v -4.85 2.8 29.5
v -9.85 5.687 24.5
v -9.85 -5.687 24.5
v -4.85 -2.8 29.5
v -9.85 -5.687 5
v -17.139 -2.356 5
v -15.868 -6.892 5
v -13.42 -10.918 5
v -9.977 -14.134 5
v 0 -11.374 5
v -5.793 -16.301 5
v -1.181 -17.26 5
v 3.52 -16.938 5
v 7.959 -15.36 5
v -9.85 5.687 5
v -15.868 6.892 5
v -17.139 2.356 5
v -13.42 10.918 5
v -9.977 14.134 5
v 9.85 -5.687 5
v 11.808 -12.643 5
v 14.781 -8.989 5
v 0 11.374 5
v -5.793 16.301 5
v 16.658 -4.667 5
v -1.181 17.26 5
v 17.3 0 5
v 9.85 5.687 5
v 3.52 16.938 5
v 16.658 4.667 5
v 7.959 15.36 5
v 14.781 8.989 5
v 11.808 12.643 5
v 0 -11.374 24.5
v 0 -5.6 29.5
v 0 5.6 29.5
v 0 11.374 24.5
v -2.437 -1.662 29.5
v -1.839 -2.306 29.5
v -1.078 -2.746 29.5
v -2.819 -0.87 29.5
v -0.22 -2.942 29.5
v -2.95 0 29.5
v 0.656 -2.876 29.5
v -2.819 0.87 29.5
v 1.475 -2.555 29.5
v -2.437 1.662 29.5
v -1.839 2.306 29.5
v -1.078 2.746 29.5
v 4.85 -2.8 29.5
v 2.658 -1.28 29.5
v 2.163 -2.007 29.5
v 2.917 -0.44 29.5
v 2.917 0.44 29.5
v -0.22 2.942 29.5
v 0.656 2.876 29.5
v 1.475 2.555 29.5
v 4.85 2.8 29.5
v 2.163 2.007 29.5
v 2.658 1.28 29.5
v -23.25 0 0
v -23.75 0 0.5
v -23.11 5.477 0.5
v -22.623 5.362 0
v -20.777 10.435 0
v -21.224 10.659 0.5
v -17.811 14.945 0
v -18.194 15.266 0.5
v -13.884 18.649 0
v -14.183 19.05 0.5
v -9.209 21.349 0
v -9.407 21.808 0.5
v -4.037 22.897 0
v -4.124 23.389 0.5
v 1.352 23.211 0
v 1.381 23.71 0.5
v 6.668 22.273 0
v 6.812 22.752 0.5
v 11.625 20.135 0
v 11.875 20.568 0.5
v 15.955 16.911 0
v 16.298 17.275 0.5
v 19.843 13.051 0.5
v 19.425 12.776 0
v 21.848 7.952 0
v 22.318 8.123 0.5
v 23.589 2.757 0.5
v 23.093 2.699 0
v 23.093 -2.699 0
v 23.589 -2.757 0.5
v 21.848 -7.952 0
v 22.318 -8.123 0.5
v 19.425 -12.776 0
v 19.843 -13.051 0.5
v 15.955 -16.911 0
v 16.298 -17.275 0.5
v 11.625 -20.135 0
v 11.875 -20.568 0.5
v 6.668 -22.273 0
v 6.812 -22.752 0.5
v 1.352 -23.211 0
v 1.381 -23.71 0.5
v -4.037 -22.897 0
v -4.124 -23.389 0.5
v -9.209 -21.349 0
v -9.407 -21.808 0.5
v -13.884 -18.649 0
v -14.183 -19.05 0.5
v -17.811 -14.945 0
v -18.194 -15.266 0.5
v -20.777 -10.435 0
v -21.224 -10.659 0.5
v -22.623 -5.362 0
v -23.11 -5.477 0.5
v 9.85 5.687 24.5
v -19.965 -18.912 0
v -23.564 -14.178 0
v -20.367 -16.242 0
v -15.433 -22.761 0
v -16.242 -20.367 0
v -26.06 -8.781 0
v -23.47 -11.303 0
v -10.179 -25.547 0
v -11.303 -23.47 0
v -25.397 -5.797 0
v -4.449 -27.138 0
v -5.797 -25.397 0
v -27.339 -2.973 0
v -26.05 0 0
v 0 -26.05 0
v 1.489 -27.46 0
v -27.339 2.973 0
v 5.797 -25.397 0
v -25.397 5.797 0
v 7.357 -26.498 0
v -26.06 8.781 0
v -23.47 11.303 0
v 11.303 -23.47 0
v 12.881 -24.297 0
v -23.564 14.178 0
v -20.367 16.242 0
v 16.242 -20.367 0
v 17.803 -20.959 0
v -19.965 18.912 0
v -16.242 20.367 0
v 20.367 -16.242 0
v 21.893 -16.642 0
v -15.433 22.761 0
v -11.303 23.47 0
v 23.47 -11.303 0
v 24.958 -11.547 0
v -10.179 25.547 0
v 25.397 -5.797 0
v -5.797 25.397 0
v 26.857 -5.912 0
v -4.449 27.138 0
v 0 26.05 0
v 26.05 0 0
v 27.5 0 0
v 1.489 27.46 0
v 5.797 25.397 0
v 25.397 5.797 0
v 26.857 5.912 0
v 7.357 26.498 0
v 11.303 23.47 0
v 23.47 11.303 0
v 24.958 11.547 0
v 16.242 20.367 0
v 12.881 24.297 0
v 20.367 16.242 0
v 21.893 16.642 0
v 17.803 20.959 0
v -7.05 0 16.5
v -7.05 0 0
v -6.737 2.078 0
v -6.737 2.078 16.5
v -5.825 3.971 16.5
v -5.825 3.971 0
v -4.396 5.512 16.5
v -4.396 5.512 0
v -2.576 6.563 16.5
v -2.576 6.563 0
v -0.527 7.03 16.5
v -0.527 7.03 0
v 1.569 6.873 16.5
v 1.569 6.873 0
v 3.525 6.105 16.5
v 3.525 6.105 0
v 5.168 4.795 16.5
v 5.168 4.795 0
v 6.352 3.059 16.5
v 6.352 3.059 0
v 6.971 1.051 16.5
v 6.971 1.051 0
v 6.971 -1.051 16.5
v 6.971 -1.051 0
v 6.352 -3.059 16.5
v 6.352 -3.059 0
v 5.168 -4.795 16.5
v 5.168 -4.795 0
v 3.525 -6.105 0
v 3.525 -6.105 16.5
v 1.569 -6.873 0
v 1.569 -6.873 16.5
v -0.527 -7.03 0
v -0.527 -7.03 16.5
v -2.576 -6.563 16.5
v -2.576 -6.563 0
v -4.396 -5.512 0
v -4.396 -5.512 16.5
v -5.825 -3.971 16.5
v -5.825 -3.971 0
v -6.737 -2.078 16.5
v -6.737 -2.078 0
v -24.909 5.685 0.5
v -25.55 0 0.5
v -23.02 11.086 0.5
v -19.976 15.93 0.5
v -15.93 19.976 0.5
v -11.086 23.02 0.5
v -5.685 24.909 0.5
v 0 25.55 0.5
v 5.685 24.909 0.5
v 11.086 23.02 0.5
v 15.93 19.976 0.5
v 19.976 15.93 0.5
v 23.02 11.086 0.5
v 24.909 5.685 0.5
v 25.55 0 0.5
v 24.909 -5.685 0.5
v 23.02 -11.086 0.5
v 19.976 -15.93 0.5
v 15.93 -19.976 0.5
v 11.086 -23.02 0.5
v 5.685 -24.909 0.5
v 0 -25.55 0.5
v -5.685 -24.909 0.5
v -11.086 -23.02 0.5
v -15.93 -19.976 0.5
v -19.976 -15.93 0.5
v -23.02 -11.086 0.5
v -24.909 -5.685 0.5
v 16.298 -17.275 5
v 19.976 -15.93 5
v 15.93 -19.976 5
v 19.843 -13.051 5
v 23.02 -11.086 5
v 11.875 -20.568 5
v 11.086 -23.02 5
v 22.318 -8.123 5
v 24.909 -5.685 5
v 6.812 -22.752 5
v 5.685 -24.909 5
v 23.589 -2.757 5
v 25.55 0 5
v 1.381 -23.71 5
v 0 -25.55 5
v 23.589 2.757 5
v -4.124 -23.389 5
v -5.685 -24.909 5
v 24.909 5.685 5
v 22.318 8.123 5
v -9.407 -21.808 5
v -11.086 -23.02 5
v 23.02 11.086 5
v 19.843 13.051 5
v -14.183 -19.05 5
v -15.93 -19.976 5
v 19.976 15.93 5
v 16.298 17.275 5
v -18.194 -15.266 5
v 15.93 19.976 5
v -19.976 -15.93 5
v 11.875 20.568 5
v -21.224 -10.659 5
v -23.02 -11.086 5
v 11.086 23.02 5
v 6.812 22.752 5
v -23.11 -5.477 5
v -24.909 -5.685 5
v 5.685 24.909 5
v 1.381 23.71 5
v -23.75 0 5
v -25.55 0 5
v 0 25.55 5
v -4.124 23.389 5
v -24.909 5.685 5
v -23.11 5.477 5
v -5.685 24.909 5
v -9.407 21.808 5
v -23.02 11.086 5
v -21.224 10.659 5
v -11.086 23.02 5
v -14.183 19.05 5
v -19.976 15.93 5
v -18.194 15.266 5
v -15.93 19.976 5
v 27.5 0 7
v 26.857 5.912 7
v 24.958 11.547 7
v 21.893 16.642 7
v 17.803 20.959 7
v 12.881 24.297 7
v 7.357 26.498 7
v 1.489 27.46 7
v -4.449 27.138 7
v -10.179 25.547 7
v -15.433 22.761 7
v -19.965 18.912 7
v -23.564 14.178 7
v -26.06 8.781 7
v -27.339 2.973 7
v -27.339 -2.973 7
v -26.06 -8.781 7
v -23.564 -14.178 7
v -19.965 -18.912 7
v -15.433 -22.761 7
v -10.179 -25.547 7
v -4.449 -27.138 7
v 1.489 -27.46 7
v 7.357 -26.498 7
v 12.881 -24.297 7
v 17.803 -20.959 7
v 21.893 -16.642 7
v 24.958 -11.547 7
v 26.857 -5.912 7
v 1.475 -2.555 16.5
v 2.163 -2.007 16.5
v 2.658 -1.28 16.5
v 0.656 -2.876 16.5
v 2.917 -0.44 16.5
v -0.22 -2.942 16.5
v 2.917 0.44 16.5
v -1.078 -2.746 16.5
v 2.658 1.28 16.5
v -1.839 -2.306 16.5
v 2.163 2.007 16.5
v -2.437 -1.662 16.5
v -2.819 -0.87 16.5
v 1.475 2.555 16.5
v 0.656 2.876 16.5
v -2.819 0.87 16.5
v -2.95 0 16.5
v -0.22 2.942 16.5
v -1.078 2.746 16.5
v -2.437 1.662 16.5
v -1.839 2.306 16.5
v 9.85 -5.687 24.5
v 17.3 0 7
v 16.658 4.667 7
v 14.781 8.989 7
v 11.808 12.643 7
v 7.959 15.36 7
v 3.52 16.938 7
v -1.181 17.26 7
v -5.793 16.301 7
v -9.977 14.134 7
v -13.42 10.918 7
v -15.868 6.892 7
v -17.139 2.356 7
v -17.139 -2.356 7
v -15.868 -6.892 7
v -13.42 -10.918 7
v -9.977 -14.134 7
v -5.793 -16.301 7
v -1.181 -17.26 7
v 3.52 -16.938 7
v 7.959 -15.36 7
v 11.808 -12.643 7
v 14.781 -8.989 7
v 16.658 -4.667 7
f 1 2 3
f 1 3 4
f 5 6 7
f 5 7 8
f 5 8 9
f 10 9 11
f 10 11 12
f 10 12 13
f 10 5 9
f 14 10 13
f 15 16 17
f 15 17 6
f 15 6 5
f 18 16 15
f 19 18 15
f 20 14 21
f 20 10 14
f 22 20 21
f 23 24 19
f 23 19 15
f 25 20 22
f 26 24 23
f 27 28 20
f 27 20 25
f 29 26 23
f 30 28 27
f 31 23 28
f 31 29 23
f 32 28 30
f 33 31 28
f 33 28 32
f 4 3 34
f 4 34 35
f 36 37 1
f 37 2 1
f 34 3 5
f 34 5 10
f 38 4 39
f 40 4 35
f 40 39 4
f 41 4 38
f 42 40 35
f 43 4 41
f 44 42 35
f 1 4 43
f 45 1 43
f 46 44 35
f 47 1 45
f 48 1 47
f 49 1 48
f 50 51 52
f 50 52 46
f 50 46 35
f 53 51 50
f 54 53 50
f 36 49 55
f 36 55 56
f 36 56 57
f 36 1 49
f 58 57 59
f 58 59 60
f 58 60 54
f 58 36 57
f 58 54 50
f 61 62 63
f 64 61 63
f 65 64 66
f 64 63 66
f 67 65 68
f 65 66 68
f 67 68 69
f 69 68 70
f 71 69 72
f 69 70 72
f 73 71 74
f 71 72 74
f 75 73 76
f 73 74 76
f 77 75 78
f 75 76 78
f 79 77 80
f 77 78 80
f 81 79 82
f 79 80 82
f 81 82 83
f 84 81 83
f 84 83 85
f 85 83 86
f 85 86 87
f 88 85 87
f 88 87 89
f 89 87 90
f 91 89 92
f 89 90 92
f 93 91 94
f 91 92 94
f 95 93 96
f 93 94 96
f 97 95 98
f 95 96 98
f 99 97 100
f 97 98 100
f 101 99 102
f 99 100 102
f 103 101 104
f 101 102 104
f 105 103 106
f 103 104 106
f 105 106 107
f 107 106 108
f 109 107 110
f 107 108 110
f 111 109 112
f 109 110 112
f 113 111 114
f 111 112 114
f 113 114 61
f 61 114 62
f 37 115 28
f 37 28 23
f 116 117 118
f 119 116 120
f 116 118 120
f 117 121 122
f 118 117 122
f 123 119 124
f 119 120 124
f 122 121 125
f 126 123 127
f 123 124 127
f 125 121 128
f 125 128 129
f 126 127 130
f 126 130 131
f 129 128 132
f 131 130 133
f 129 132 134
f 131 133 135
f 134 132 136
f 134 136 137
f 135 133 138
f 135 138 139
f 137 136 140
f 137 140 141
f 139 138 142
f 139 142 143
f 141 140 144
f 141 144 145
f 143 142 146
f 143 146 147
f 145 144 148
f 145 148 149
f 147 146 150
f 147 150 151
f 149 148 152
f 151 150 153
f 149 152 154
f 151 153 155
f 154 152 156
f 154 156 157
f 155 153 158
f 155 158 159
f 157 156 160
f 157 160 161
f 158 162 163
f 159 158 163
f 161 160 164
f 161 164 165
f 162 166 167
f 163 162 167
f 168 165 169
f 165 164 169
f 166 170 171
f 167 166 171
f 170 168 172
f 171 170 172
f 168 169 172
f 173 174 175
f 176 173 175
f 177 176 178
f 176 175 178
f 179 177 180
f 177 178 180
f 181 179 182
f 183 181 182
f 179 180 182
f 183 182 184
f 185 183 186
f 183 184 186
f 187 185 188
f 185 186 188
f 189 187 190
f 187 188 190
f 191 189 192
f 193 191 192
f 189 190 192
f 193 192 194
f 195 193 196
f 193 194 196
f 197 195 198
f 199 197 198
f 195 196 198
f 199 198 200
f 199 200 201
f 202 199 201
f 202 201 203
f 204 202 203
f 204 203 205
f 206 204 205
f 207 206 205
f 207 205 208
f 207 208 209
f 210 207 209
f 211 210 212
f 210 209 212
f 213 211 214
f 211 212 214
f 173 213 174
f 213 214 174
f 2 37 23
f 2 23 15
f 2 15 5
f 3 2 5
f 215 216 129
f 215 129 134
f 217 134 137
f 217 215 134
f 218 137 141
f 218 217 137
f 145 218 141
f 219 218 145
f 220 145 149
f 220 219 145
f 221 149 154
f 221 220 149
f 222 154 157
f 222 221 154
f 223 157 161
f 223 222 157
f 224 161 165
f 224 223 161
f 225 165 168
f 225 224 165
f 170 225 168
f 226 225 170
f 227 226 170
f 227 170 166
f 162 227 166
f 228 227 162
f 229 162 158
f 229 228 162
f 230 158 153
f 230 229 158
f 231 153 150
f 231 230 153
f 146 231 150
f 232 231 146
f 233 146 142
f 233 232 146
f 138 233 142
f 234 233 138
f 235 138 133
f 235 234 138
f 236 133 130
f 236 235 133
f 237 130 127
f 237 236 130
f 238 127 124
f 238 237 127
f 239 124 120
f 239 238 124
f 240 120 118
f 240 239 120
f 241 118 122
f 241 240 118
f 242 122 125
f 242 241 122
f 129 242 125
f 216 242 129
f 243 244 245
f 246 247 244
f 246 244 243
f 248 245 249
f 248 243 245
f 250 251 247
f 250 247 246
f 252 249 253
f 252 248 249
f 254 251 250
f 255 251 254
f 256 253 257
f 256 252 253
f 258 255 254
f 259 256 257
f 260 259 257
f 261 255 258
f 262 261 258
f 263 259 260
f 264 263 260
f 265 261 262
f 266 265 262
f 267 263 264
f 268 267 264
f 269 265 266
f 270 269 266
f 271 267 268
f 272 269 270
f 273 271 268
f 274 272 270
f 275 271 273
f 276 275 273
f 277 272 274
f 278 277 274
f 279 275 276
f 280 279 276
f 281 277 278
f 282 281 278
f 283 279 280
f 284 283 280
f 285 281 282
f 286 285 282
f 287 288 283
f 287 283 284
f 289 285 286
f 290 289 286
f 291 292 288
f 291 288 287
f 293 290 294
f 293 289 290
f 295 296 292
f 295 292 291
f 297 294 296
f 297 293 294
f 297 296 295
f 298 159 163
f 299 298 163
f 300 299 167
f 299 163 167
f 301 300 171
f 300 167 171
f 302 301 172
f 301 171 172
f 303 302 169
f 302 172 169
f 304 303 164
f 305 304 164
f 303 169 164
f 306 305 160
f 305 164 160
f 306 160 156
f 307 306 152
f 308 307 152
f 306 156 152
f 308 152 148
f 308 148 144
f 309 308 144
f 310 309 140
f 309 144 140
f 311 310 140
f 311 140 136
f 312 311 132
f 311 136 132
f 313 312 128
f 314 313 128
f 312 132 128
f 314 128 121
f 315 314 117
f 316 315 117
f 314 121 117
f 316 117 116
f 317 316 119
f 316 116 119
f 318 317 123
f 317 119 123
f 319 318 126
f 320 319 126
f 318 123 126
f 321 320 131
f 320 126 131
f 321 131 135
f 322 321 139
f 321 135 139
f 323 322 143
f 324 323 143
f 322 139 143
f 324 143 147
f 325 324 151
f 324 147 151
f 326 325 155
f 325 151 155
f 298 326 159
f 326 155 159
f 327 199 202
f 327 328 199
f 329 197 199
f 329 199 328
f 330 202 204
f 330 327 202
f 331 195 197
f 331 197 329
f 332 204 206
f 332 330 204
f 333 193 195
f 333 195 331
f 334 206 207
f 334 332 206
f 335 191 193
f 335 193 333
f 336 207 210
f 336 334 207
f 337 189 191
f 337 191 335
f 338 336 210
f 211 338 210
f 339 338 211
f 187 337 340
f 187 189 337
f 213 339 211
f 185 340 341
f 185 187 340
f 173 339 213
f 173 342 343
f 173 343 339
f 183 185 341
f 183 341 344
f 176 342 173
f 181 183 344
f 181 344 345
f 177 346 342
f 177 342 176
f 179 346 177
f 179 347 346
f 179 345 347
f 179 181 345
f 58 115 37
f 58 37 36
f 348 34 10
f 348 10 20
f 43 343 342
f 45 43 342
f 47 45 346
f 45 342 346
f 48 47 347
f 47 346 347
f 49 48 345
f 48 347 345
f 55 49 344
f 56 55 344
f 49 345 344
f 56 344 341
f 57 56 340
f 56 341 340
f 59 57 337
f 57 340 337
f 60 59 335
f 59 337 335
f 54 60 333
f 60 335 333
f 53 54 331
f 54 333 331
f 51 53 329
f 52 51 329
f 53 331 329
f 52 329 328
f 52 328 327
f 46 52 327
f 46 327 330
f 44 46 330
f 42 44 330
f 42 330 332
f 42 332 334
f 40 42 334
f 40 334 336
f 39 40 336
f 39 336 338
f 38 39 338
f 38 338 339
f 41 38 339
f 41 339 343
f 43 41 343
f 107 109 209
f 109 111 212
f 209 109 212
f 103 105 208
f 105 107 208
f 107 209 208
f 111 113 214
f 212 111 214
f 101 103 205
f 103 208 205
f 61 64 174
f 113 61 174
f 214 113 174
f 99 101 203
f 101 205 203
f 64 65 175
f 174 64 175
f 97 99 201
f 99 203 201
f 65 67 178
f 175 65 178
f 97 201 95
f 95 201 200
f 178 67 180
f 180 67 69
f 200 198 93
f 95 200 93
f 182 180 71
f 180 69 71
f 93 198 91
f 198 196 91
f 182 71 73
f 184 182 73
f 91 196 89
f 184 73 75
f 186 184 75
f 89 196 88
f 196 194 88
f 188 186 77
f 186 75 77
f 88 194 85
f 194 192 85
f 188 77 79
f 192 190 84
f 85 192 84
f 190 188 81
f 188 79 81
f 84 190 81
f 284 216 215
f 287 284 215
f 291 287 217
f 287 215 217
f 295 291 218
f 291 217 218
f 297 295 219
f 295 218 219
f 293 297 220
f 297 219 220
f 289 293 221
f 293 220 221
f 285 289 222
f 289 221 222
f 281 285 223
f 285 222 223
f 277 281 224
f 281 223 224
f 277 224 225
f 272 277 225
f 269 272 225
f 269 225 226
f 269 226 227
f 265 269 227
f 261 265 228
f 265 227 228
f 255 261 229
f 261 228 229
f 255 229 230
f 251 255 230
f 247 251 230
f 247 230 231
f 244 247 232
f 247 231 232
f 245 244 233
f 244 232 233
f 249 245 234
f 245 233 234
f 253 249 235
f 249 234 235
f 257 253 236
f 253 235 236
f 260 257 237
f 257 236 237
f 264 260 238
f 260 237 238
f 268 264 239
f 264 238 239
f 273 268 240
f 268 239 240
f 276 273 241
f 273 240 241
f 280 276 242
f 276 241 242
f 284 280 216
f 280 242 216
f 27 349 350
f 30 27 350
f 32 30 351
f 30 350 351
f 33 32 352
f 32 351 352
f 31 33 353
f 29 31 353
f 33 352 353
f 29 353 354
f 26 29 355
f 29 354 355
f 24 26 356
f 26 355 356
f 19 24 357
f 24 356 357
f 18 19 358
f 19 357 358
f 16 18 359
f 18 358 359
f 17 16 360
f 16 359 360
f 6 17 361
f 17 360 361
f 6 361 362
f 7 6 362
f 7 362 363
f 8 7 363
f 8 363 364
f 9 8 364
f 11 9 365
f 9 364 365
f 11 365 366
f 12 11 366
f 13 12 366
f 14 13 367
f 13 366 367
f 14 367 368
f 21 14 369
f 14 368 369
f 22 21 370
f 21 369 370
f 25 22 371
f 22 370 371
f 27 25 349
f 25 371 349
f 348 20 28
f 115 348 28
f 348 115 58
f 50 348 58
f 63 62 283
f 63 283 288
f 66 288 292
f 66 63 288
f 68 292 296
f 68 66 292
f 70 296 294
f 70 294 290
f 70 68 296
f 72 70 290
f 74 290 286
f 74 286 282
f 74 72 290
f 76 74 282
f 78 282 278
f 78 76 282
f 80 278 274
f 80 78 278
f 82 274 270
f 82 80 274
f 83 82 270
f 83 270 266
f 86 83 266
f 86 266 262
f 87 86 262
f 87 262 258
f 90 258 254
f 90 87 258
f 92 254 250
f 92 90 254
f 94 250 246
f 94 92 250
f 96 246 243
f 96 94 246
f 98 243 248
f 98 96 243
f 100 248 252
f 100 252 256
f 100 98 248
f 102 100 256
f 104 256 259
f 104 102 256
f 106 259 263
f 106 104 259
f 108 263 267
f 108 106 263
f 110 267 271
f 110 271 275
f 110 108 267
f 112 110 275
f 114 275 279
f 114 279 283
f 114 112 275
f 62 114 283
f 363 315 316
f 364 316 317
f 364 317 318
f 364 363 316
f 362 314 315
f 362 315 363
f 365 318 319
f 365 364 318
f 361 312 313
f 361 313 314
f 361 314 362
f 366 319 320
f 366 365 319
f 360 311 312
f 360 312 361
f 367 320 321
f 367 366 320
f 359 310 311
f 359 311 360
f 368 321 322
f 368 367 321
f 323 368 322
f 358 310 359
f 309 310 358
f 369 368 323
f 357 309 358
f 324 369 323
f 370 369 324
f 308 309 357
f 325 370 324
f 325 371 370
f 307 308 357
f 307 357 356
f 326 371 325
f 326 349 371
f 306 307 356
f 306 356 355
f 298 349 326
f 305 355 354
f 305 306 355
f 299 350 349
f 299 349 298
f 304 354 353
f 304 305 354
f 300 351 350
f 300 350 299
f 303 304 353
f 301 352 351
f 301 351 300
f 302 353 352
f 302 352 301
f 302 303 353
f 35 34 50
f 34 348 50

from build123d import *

# Parameters (mm, degrees)
SKETCH1_R           = 27.5
BOSS_EXTRUDE1_DEPTH = 7
SKETCH2_R           = 17.3
CUT_EXTRUDE1_DEPTH  = 2
BOSS_EXTRUDE2_DEPTH = 19.5
BOSS_EXTRUDE3_DEPTH = 5
BOSS_EXTRUDE3_TAPER = 45
SKETCH5_R           = 7.05
CUT_EXTRUDE2_DEPTH  = 16.5
SKETCH6_R           = 2.95
CUT_EXTRUDE3_DEPTH  = 43.246301613
SKETCH7_R           = 25.55
SKETCH7_R_2         = 23.75
CUT_EXTRUDE4_DEPTH  = 5
CHAMFER1_SIZE       = 0.5


with BuildPart() as part:
    # Sketch1 → Boss-Extrude1 (new body)
    with BuildSketch(Plane.XY):
        Circle(SKETCH1_R)
    extrude(amount=BOSS_EXTRUDE1_DEPTH)

    # Sketch2 → Cut-Extrude1 (cut)
    with BuildSketch(Plane.XY.offset(7)):
        Circle(SKETCH2_R)
    extrude(amount=-CUT_EXTRUDE1_DEPTH, mode=Mode.SUBTRACT)

    # Sketch3 → Boss-Extrude2 (add)
    with BuildSketch(Plane.XY.offset(5)):
        Polygon((0, 11.373800303), (-9.85, 5.686900152), (-9.85, -5.686900152), (0, -11.373800303), (9.85, -5.686900152), (9.85, 5.686900152), align=None)
    extrude(amount=BOSS_EXTRUDE2_DEPTH)

    # Sketch4 → Boss-Extrude3 (add)
    with BuildSketch(Plane.XY.offset(24.5)):
        Polygon((9.85, 5.686900152), (0, 11.373800303), (-9.85, 5.686900152), (-9.85, -5.686900152), (0, -11.373800303), (9.85, -5.686900152), align=None)
    extrude(amount=BOSS_EXTRUDE3_DEPTH, taper=BOSS_EXTRUDE3_TAPER)

    # Sketch5 → Cut-Extrude2 (cut)
    with BuildSketch(Plane(origin=(0, 0, 0), x_dir=(-1, 0, 0), z_dir=(0, 0, -1))):
        Circle(SKETCH5_R)
    extrude(amount=-CUT_EXTRUDE2_DEPTH, mode=Mode.SUBTRACT)

    # Sketch6 → Cut-Extrude3 (cut, through all)
    with BuildSketch(Plane(origin=(0, 0, 16.5), x_dir=(-1, 0, 0), z_dir=(0, 0, -1))):
        Circle(SKETCH6_R)
    extrude(amount=-CUT_EXTRUDE3_DEPTH, mode=Mode.SUBTRACT)

    # Sketch7 → Cut-Extrude4 (cut)
    with BuildSketch(Plane(origin=(0, 0, 0), x_dir=(-1, 0, 0), z_dir=(0, 0, -1))):
        Circle(SKETCH7_R)
        Circle(SKETCH7_R_2, mode=Mode.SUBTRACT)
    extrude(amount=-CUT_EXTRUDE4_DEPTH, mode=Mode.SUBTRACT)

    # Chamfer1
    chamfer1_edges = [part.edges().sort_by_distance(p)[0] for p in [
        (25.55, 0, 0),
        (23.75, 0, 0),
    ]]
    chamfer(chamfer1_edges, length=CHAMFER1_SIZE)


solid = part.part
